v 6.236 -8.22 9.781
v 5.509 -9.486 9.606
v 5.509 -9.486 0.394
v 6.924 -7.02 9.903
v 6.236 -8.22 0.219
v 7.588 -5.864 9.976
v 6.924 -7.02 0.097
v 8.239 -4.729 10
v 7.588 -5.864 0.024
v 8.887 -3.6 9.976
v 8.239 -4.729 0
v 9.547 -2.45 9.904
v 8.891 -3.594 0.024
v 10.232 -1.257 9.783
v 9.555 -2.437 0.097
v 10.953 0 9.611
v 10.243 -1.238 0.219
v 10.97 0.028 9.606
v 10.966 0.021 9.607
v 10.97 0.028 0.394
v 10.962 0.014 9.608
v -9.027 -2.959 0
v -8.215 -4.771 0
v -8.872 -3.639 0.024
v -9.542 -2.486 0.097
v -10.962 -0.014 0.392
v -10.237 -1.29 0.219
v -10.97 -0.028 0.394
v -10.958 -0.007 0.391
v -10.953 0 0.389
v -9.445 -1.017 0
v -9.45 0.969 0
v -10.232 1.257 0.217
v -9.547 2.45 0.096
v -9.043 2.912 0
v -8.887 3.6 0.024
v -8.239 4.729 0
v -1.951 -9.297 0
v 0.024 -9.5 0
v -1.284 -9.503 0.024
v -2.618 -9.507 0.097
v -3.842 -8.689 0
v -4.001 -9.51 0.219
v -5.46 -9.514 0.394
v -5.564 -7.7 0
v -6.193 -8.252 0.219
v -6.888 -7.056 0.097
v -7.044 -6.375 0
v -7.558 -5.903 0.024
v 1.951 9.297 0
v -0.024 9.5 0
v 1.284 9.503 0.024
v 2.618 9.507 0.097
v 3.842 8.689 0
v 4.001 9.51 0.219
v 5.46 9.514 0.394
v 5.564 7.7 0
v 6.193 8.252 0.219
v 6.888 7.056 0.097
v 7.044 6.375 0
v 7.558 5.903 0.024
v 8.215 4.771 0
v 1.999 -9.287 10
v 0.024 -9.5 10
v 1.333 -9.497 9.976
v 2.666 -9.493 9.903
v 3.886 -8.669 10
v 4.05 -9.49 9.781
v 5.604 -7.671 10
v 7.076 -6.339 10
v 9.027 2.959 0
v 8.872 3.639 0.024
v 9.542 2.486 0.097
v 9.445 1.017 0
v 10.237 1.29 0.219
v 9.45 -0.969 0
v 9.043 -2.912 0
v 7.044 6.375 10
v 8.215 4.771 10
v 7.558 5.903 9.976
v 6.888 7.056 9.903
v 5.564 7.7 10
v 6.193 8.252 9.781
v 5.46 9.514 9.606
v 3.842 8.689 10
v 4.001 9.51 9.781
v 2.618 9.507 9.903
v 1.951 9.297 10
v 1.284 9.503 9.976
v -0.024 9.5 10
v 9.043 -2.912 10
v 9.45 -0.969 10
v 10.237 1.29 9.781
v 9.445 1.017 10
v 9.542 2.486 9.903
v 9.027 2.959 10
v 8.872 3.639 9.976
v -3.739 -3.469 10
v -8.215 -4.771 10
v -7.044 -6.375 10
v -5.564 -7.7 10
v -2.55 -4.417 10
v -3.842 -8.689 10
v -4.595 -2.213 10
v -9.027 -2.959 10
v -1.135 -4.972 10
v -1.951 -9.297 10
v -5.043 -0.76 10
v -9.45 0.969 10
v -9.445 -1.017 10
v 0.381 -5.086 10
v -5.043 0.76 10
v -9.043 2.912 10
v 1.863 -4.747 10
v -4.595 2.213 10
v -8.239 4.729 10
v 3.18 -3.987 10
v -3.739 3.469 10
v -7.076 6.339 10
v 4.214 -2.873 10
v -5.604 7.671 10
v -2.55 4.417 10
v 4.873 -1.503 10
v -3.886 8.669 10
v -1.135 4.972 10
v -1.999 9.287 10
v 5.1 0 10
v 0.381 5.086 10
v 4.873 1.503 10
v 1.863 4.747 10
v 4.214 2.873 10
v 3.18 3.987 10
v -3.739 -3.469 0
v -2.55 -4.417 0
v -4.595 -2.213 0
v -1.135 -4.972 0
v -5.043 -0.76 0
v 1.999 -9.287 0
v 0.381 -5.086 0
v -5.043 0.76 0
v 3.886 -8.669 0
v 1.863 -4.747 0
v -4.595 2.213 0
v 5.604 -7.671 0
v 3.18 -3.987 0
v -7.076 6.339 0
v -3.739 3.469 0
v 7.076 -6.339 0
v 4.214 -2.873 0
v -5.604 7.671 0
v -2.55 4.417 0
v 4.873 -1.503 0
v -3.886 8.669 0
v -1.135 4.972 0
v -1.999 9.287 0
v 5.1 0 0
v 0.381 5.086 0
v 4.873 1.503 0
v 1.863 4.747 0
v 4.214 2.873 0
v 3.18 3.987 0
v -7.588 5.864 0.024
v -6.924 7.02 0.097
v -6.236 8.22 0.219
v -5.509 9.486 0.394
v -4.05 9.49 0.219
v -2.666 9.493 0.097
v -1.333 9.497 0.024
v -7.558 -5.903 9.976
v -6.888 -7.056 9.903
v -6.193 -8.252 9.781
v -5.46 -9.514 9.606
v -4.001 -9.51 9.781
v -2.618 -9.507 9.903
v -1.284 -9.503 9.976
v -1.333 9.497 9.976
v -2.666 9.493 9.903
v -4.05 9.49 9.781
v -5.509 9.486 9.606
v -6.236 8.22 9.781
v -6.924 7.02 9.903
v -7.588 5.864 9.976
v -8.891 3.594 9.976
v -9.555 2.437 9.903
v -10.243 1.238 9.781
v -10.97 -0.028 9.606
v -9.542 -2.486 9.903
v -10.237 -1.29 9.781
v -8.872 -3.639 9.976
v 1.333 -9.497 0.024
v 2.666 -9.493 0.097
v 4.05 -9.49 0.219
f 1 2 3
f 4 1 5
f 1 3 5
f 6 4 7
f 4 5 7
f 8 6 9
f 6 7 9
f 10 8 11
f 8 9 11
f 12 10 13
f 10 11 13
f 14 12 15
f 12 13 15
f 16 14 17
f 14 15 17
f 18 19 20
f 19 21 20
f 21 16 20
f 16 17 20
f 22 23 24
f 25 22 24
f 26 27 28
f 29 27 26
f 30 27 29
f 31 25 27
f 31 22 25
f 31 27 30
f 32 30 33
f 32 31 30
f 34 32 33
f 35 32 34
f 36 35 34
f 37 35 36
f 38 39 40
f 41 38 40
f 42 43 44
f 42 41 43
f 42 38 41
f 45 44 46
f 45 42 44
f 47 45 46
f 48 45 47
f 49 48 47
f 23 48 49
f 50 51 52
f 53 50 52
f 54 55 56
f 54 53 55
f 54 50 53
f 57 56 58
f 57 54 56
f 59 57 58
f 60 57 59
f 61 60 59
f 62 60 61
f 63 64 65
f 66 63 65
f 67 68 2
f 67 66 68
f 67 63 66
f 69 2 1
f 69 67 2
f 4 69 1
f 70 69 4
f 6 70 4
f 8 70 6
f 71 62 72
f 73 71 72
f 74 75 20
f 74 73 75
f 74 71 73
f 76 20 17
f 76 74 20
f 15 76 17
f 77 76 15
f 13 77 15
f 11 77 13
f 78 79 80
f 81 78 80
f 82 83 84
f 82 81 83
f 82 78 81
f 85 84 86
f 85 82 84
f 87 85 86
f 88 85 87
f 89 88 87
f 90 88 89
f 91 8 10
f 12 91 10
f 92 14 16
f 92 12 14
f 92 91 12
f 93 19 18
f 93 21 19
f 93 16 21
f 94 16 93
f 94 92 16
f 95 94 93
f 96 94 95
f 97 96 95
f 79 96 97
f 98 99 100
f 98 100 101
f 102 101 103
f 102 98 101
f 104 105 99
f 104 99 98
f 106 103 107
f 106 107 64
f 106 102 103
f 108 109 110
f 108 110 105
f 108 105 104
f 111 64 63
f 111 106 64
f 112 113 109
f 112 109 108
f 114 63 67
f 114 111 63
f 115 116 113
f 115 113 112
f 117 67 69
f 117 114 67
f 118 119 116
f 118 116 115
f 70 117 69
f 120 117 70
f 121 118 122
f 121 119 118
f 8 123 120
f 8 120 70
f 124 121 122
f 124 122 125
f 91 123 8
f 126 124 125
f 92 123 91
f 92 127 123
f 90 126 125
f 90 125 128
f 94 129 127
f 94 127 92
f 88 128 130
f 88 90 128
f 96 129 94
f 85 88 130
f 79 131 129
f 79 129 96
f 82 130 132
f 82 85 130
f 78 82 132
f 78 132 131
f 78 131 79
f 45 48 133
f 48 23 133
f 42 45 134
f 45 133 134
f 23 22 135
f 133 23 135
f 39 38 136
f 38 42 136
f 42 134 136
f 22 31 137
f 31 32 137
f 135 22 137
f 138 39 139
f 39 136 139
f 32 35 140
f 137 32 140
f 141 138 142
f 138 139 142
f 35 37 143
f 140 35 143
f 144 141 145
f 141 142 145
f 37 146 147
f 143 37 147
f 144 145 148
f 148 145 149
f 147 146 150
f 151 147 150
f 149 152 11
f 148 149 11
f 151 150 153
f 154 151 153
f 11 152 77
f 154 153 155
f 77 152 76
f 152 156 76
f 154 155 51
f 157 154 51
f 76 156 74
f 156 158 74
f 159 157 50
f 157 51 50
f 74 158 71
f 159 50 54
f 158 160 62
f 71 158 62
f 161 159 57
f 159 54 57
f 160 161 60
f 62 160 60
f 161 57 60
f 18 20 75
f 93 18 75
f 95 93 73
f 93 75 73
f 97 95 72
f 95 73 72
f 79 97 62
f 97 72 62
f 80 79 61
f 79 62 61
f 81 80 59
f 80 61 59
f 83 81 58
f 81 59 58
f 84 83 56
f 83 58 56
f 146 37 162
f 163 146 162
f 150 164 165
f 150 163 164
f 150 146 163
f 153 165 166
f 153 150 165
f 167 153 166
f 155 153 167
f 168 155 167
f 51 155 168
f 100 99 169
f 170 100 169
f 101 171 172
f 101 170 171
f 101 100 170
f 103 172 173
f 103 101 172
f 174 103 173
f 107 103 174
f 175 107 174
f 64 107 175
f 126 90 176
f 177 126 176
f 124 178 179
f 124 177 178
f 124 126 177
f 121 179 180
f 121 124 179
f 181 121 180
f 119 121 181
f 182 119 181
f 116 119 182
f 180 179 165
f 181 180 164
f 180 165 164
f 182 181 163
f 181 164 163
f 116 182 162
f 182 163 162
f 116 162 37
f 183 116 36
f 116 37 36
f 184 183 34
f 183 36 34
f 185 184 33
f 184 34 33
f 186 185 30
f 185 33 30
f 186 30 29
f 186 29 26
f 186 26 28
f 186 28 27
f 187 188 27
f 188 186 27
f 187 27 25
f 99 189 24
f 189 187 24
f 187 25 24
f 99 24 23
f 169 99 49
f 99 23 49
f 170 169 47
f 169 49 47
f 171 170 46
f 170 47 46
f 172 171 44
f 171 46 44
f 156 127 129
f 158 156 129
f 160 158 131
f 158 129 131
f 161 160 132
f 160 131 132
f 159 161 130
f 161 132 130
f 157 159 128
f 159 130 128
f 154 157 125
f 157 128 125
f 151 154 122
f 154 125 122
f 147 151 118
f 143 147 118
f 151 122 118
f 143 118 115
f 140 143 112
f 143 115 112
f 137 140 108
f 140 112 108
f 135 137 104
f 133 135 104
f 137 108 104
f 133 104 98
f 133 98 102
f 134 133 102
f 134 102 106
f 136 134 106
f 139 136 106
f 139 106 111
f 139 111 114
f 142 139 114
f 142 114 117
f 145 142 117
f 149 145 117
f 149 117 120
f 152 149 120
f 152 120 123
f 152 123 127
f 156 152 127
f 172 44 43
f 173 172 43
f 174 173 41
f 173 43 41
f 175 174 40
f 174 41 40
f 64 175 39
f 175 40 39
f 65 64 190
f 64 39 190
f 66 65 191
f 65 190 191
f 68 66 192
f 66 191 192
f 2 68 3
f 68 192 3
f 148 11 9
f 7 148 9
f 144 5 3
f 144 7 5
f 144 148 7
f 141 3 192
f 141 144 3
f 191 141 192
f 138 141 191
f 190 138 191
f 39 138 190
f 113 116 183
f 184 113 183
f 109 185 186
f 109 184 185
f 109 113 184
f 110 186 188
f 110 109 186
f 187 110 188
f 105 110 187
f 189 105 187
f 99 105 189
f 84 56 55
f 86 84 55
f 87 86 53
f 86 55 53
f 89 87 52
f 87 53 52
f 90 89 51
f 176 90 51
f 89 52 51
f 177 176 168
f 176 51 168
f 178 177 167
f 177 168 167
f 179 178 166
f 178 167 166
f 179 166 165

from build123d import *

# Parameters (mm, degrees)
RESSALTO_EXTRUS_O1_DEPTH = 10
ESBO_O2_OUTSIDE_W        = 142.044
ESBO_O2_OUTSIDE_H        = 139.132
ESBO_O2_OUTSIDE_R        = 9.5
CORTE_EXTRUS_O1_DEPTH    = 15
CORTE_EXTRUS_O1_DRAFT    = -75
ESBO_O3_OUTSIDE_W        = 142.044
ESBO_O3_OUTSIDE_H        = 139.132
ESBO_O3_OUTSIDE_R        = 9.5
CORTE_EXTRUS_O2_DEPTH    = 15
CORTE_EXTRUS_O2_DRAFT    = -75
FURO_ROSCADO_DE_M121_D   = 10.2


with BuildPart() as part:
    # Esboço1 → Ressalto-extrusão1 (new body)
    with BuildSketch(Plane.XY):
        Polygon((5.460449769, 9.51403288), (-5.509169282, 9.485904657), (-10.969619052, -0.028128224), (-5.460449769, -9.51403288), (5.509169282, -9.485904657), (10.969619052, 0.028128224), align=None)
    extrude(amount=RESSALTO_EXTRUS_O1_DEPTH)


with BuildPart() as corte_extrus_o1_tool:
    # Esboço2 outside → Corte-extrusão1 (with draft: the straight prism first)
    with BuildSketch(Plane.XY.offset(10)):
        Rectangle(ESBO_O2_OUTSIDE_W, ESBO_O2_OUTSIDE_H)
        Circle(ESBO_O2_OUTSIDE_R, mode=Mode.SUBTRACT)
    extrude(amount=-CORTE_EXTRUS_O1_DEPTH)
    # Corte-extrusão1: the draft: its side faces are tilted about the plane it starts from
    corte_extrus_o1_sides = [corte_extrus_o1_tool.faces().sort_by_distance(p)[0] for p in [
        (0, -69.566, 2.5),
        (71.022, 0, 2.5),
        (0, 69.566, 2.5),
        (-71.022, 0, 2.5),
        (-9.5, 0, 2.5),
    ]]
    draft(corte_extrus_o1_sides, Plane.XY.offset(10), CORTE_EXTRUS_O1_DRAFT)


with BuildPart() as part_1:
    add(part.part)

    # Corte-extrusão1: cut by corte_extrus_o1_tool
    add(corte_extrus_o1_tool.part, mode=Mode.SUBTRACT)


with BuildPart() as corte_extrus_o2_tool:
    # Esboço3 outside → Corte-extrusão2 (with draft: the straight prism first)
    with BuildSketch(Plane(origin=(0, 0, 0), x_dir=(-1, 0, 0), z_dir=(0, 0, -1))):
        Rectangle(ESBO_O3_OUTSIDE_W, ESBO_O3_OUTSIDE_H)
        Circle(ESBO_O3_OUTSIDE_R, mode=Mode.SUBTRACT)
    extrude(amount=-CORTE_EXTRUS_O2_DEPTH)
    # Corte-extrusão2: the draft: its side faces are tilted about the plane it starts from
    corte_extrus_o2_sides = [corte_extrus_o2_tool.faces().sort_by_distance(p)[0] for p in [
        (0, -69.566, 7.5),
        (-71.022, 0, 7.5),
        (0, 69.566, 7.5),
        (71.022, 0, 7.5),
        (9.5, 0, 7.5),
    ]]
    draft(corte_extrus_o2_sides, Plane(origin=(0, 0, 0), x_dir=(-1, 0, 0), z_dir=(0, 0, -1)), CORTE_EXTRUS_O2_DRAFT)


with BuildPart() as part_2:
    add(part_1.part)

    # Corte-extrusão2: cut by corte_extrus_o2_tool
    add(corte_extrus_o2_tool.part, mode=Mode.SUBTRACT)

    # Furo roscado de M121 (through all)
    with Locations(Plane(origin=(0, 0, 0), x_dir=(-1, 0, 0), z_dir=(0, 0, -1))):
        with Locations((0, 0)):
            Hole(FURO_ROSCADO_DE_M121_D / 2)


solid = part_2.part
